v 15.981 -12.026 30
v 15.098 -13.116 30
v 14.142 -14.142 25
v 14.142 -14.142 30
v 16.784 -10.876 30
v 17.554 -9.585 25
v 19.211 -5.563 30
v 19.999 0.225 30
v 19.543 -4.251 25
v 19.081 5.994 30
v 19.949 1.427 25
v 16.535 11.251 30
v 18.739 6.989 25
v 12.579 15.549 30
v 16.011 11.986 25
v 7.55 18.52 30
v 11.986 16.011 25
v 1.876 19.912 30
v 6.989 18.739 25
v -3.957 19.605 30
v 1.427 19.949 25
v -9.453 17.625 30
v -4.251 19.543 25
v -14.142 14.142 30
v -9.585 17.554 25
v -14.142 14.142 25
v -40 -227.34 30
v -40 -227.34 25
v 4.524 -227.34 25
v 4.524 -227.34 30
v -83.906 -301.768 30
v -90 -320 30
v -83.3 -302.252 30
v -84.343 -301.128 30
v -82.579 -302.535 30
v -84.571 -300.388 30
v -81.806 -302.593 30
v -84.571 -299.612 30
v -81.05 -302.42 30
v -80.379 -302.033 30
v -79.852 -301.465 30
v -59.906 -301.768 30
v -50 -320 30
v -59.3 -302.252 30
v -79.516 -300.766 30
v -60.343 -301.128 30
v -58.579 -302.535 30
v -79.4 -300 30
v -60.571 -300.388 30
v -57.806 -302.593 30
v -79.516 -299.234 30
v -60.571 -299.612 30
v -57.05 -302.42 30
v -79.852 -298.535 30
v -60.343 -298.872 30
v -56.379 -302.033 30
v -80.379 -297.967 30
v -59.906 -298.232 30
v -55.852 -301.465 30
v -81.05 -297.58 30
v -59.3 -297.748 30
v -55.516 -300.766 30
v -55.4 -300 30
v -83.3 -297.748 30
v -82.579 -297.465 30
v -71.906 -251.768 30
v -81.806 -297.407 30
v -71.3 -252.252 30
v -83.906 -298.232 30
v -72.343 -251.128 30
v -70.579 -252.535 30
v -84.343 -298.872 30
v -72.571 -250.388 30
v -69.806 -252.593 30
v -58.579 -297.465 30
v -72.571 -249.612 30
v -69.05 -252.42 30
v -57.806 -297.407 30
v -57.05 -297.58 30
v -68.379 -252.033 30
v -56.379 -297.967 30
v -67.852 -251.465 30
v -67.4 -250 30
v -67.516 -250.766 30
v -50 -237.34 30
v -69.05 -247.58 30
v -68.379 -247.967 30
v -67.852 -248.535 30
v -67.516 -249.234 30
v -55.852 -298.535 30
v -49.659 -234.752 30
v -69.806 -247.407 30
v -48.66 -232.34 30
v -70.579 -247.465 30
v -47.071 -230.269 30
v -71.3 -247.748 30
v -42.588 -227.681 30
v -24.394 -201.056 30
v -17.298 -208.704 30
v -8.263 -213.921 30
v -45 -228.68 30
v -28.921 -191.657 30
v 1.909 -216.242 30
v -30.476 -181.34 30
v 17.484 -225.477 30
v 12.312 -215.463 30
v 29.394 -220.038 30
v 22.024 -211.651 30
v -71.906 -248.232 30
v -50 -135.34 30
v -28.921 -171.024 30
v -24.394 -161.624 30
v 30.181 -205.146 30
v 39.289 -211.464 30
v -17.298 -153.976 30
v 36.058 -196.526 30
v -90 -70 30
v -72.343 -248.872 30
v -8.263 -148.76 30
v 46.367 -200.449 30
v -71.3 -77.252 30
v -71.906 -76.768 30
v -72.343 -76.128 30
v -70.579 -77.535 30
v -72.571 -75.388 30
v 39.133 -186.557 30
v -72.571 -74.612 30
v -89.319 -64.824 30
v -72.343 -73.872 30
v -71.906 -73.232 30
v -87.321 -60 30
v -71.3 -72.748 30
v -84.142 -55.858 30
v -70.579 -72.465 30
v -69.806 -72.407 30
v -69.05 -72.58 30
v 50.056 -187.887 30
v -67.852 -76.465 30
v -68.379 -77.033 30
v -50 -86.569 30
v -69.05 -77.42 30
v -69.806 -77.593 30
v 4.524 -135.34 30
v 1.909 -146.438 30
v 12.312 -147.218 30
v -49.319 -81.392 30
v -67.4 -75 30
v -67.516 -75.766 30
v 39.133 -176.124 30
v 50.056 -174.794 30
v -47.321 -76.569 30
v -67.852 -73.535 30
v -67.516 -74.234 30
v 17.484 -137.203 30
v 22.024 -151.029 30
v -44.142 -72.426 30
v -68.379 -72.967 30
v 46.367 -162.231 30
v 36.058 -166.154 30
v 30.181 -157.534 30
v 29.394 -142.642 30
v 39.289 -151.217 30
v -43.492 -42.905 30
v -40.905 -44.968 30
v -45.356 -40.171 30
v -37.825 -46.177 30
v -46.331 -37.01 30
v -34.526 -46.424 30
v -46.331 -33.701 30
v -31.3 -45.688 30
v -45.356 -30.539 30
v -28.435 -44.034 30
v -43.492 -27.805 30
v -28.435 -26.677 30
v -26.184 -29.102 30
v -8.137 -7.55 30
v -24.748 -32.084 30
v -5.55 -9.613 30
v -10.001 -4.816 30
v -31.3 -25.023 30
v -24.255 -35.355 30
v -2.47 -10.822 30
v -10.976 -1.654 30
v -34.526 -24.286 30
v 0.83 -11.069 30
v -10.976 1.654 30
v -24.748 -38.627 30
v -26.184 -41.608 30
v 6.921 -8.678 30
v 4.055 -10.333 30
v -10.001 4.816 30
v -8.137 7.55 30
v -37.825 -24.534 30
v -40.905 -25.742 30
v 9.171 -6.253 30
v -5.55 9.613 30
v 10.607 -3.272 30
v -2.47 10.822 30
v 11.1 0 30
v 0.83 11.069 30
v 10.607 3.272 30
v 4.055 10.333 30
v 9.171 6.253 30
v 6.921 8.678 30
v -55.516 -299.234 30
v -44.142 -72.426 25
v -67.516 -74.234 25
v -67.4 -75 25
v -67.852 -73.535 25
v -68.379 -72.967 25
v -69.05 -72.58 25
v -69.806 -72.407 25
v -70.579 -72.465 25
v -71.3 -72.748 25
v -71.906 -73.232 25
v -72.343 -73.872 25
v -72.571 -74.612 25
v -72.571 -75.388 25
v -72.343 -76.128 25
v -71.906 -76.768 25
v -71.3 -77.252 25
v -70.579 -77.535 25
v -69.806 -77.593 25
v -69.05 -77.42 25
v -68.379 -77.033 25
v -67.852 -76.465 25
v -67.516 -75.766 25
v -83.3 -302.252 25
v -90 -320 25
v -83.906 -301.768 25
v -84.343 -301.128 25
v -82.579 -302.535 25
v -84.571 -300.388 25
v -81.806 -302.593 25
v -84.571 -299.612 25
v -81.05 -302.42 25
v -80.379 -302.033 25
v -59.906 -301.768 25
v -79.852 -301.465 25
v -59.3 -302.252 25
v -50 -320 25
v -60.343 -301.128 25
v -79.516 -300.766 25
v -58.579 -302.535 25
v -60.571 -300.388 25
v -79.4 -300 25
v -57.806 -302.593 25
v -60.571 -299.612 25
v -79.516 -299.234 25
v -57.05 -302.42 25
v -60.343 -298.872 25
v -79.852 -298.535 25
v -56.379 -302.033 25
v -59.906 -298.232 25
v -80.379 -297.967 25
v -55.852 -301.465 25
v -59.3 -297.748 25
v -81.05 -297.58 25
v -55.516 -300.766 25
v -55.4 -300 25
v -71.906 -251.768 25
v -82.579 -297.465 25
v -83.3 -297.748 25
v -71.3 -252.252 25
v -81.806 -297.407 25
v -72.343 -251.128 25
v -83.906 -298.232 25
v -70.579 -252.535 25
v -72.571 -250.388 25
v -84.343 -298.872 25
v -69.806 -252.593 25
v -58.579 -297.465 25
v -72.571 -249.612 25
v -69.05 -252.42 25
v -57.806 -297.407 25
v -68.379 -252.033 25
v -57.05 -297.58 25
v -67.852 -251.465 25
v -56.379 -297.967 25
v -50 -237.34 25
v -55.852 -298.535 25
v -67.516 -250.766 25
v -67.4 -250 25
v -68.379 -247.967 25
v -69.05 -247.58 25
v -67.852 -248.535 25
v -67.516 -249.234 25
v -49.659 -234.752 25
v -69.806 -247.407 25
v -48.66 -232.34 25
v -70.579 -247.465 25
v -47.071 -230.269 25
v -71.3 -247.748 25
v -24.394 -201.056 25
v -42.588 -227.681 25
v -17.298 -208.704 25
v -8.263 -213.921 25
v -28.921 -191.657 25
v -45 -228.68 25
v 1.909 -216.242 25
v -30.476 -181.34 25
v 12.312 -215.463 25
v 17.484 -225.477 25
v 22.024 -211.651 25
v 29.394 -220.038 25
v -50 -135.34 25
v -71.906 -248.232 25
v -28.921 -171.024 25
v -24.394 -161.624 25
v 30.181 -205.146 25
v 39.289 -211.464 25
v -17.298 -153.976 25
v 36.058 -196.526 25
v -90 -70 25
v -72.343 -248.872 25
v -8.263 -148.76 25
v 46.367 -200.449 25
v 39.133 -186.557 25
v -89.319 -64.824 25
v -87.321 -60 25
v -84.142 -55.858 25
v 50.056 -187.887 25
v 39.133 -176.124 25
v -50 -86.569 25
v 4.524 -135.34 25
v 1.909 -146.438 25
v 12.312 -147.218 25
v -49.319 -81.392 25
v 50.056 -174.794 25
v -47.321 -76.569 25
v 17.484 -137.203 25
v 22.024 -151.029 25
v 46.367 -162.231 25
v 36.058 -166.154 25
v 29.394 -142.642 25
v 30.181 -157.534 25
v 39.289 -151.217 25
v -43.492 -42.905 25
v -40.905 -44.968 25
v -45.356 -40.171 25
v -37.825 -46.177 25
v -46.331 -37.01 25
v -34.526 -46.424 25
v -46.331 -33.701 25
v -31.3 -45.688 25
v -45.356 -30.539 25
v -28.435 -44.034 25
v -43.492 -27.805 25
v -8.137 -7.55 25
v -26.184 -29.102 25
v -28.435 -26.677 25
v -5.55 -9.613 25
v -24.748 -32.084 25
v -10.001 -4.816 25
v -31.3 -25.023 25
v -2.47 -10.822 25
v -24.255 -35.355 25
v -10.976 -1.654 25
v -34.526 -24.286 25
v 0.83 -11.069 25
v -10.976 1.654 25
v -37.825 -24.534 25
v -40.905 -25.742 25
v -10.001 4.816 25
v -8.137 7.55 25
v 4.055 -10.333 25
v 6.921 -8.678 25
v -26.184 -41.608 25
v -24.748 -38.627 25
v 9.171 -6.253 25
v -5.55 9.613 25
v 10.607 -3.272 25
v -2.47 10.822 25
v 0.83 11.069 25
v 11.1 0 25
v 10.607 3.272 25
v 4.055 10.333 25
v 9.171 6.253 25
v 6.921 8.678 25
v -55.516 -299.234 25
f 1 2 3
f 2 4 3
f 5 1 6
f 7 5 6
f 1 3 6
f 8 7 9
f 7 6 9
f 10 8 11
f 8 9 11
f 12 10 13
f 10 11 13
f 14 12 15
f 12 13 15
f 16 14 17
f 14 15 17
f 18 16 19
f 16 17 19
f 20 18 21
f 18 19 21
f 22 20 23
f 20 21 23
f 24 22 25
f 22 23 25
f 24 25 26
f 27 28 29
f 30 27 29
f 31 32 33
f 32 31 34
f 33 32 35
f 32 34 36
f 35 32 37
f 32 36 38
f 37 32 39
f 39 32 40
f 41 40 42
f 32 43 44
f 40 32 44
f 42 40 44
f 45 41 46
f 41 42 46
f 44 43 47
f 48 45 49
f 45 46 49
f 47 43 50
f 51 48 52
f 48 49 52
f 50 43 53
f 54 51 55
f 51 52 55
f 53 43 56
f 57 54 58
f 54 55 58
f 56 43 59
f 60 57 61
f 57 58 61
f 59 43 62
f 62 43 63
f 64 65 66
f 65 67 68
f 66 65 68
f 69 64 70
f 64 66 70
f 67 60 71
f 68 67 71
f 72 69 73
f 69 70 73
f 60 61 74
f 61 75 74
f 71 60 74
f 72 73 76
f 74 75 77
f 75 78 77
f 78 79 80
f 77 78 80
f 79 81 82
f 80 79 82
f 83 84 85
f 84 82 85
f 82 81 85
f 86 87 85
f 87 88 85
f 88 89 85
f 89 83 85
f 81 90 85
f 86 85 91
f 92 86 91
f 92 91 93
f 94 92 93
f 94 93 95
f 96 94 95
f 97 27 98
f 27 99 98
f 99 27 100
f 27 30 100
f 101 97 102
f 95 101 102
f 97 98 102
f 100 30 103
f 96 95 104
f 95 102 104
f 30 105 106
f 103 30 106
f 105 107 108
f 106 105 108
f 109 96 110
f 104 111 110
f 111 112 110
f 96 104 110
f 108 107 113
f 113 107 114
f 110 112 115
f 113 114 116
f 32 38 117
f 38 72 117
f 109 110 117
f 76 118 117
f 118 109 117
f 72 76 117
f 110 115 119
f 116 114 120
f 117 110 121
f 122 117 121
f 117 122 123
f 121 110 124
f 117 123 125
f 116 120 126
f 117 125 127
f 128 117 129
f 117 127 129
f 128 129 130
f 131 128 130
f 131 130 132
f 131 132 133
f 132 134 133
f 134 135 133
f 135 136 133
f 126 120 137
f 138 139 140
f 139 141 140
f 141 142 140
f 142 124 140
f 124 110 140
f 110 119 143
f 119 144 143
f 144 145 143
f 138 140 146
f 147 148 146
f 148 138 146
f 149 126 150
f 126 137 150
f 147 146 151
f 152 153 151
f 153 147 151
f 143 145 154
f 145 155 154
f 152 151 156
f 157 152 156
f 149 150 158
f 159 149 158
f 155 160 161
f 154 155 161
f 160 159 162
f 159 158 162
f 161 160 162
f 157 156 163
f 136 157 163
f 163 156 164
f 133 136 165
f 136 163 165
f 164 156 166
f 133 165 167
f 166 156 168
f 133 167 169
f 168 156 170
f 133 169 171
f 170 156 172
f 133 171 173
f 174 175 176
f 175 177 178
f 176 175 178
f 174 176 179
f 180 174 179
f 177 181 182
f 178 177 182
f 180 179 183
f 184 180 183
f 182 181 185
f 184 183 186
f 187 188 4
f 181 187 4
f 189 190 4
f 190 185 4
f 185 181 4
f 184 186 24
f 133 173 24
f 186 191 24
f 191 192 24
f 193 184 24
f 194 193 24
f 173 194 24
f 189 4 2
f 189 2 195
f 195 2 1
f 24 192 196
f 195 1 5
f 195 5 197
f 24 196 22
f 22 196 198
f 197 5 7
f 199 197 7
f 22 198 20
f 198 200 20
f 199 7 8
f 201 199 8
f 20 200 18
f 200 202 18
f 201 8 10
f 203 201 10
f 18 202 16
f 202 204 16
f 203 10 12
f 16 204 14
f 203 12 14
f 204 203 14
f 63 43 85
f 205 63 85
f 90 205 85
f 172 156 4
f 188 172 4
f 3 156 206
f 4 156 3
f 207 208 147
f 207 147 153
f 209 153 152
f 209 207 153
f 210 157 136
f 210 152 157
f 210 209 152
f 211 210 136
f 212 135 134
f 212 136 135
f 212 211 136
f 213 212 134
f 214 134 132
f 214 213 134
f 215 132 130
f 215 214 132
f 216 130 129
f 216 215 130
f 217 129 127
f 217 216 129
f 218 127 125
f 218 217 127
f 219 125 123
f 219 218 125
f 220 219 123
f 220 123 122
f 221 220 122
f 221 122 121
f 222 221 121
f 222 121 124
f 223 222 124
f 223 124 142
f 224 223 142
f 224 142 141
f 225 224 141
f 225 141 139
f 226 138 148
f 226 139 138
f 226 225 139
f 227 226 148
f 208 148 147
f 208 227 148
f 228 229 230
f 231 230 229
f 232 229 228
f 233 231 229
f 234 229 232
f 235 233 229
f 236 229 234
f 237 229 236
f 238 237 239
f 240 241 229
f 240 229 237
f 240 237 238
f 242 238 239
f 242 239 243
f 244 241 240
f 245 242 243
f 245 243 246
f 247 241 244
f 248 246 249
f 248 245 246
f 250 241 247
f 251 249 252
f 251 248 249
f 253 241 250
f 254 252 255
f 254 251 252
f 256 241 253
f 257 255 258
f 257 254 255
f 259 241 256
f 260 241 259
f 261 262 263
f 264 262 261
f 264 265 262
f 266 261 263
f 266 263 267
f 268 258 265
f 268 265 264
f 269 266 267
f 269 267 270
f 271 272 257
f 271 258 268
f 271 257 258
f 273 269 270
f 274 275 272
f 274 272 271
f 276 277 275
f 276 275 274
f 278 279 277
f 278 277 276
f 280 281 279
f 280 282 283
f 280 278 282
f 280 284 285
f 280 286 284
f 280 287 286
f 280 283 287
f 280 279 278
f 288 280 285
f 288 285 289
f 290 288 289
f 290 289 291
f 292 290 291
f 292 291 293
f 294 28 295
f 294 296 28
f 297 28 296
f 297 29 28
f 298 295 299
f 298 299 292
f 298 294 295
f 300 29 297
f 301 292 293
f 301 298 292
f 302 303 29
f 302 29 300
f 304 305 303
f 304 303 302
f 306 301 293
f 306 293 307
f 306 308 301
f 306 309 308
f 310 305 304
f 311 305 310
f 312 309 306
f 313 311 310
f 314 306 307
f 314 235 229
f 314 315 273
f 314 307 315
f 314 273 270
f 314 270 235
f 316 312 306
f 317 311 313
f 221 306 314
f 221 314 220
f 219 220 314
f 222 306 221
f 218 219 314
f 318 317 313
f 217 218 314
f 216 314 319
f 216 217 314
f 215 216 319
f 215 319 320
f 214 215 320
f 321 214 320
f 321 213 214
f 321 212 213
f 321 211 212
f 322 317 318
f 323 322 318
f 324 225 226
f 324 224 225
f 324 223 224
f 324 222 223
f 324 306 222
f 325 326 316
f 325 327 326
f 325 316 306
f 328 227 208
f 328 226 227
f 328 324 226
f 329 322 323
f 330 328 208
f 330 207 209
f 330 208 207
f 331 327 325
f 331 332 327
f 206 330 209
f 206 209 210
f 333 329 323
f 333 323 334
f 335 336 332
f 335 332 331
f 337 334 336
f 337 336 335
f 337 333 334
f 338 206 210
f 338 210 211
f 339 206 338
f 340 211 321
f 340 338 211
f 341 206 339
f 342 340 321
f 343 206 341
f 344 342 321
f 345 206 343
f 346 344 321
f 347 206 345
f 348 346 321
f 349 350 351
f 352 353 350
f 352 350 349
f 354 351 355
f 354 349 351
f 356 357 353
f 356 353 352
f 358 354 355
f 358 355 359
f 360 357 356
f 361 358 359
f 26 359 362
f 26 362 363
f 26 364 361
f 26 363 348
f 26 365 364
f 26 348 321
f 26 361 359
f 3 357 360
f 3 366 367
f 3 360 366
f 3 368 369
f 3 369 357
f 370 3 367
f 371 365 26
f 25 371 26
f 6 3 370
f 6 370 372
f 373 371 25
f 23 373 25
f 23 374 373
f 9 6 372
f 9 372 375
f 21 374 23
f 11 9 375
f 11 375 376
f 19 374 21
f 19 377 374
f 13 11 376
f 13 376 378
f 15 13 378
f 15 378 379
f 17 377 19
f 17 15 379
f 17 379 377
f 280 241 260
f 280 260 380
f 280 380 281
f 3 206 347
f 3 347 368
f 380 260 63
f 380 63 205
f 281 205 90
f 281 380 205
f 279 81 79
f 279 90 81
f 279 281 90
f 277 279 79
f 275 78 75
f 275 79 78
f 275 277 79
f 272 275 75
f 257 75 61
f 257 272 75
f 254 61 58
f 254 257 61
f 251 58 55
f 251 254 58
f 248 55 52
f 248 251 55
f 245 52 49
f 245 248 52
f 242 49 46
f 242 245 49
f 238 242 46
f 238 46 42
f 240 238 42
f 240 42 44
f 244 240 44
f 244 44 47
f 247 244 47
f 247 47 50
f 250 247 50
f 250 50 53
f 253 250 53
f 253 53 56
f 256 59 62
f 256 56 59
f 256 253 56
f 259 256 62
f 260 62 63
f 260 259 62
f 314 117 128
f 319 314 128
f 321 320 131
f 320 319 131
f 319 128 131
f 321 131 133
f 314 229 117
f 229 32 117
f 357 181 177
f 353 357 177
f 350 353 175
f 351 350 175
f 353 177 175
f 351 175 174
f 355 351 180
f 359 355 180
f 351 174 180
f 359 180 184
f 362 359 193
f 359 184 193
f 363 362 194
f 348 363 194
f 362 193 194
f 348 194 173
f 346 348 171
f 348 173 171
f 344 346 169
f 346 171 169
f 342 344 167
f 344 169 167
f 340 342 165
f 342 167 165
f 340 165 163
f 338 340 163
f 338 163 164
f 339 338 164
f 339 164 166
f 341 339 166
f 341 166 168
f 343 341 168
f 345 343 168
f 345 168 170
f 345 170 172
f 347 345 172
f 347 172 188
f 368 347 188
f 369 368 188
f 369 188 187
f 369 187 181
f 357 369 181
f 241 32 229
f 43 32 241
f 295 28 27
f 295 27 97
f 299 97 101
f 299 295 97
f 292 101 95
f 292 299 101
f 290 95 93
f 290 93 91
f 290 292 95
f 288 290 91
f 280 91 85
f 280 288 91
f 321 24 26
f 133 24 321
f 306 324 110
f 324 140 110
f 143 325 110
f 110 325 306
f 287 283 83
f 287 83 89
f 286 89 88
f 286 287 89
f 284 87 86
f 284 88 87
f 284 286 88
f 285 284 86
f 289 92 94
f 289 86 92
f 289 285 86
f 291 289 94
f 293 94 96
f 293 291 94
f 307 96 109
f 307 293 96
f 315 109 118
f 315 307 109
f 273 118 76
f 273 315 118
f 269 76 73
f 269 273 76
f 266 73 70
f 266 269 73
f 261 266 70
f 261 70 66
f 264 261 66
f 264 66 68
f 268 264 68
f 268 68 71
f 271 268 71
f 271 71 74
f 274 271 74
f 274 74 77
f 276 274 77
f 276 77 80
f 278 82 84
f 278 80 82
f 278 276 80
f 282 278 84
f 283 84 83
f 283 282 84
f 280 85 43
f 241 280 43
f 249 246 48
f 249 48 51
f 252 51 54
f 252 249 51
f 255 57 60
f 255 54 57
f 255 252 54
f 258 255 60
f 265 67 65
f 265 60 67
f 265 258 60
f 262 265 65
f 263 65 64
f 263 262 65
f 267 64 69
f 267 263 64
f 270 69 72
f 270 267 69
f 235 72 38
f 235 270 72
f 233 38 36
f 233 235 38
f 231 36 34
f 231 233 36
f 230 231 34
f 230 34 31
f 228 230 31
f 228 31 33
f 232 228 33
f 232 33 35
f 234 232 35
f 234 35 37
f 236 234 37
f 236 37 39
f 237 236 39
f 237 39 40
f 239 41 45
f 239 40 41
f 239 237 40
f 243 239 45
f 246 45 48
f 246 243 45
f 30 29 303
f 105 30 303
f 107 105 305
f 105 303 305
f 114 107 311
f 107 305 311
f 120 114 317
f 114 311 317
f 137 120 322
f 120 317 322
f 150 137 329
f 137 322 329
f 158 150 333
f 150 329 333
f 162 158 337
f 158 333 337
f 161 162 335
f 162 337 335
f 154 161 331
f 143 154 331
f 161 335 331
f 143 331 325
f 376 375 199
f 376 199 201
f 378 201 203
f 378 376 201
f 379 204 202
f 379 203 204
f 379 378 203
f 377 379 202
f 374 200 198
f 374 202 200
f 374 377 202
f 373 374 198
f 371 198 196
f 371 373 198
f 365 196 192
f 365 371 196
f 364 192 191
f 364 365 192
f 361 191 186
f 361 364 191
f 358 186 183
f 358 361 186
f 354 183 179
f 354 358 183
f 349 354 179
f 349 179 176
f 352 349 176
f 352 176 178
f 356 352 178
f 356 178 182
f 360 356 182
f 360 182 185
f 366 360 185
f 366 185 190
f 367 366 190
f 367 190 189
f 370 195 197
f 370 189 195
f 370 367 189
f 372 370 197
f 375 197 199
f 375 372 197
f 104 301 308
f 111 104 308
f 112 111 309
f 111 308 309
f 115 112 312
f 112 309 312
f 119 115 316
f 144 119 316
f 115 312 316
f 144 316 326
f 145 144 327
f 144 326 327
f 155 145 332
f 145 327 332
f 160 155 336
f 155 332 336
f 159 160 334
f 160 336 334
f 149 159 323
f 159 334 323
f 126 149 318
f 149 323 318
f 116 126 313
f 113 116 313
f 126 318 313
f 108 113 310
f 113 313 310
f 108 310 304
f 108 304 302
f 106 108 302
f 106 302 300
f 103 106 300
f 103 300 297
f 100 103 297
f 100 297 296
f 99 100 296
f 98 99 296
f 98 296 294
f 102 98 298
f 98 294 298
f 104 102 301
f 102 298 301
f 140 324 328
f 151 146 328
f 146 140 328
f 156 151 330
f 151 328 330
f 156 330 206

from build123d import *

# Parameters (mm, degrees)
SKETCH_1_R                = 20
SKETCH_1_R_2              = 11.1
EXTRUDE_1_DEPTH           = 60
EXTRUDE_2_DEPTH           = 30
SKETCH_4_R                = 11
EXTRUDE_3_DEPTH           = 5
SKETCH_8_R                = 11.1
CUT_EXTRUDE_1_DEPTH       = 100
FILLET_4_R                = 20
EXTRUDE_START             = -30
SKETCH_18_R               = 35
EXTRUDE_4_DEPTH           = 5
EXTRUDE_START_2           = -25
SKETCH_19_R               = 35
EXTRUDE_5_DEPTH           = 5
FILLET_5_R                = 10
CUT_EXTRUDE_9_DEPTH       = 388.169213652
CUT_EXTRUDE_9_DEPTH_BACK  = 388.169213652
SKETCH_21_R               = 2.6
CUT_EXTRUDE_10_DEPTH      = 409.372938359
CUT_EXTRUDE_10_DEPTH_BACK = 409.372938359
SKETCH_22_W               = 30
SKETCH_22_H               = 469.737304999
SKETCH_22_W_2             = 35
SKETCH_22_H_2             = 431.087956996


with BuildPart() as part:
    # 草图1 → 凸台-拉伸1 (new body)
    with BuildSketch(Plane.XY):
        Circle(SKETCH_1_R)
        Circle(SKETCH_1_R_2, mode=Mode.SUBTRACT)
    extrude(amount=EXTRUDE_1_DEPTH)

    # 草图2 → 凸台-拉伸2 (add, symmetric)
    with BuildSketch(Plane.XY.offset(30)):
        with BuildLine():
            Line((-14.142135624, 14.142135624), (-90, -61.715728753))
            Line((-90, -61.715728753), (-90, -320))
            Line((-90, -320), (-50, -320))
            Line((-50, -320), (-50, -78.284271247))
            Line((-50, -78.284271247), (14.142135624, -14.142135624))
            ThreePointArc((14.142135624, -14.142135624), (-14.142135624, -14.142135624), (-14.142135624, 14.142135624))
        make_face()
    extrude(amount=EXTRUDE_2_DEPTH, both=True)

    # 草图4 → 凸台-拉伸3 (add)
    with BuildSketch(Plane.XY.offset(60)):
        with BuildLine():
            Line((-90, -290), (-50, -290))
            Line((-50, -290), (-50, -350))
            ThreePointArc((-50, -350), (-70, -370), (-90, -350))
            Line((-90, -350), (-90, -290))
        make_face()
        with Locations((-70, -350)):
            Circle(SKETCH_4_R, mode=Mode.SUBTRACT)
    extrude_3 = extrude(amount=EXTRUDE_3_DEPTH)

    # 镜向1: 凸台-拉伸3 across plane
    add(extrude_3.mirror(Plane.XY.offset(30)))

    # 草图8 → 切除-拉伸1 (cut)
    with BuildSketch(Plane.XY.offset(60)):
        with Locations((-35.355339059, -35.355339059)):
            Circle(SKETCH_8_R)
    extrude(amount=-CUT_EXTRUDE_1_DEPTH, mode=Mode.SUBTRACT)

    # 圆角4
    fillet_4_edges = [part.edges().sort_by_distance(p)[0] for p in [
        (-50, -78.284271247, 30),
        (-90, -61.715728753, 30),
    ]]
    fillet(fillet_4_edges, radius=FILLET_4_R)

    # 草图18 → 凸台-拉伸4 (add)
    with BuildSketch(Plane.XY.offset(60).offset(EXTRUDE_START)):
        with BuildLine():
            ThreePointArc((16.783988507, -10.876475983), (15.54903282, -12.578854413), (14.142135624, -14.142135624))
            Line((14.142135624, -14.142135624), (-44.142135624, -72.426406871))
            ThreePointArc((-44.142135624, -72.426406871), (-48.47759065, -78.914873848), (-50, -86.568542495))
            Line((-50, -86.568542495), (-50, -129.282056212))
            Line((-50, -129.282056212), (24.135744866, -129.282056212))
            ThreePointArc((24.135744866, -129.282056212), (66.634203362, -100.885494101), (56.662656801, -50.755144277))
            Line((56.662656801, -50.755144277), (16.783988507, -10.876475983))
        make_face()
        with Locations((24.135744866, -83.282056212)):
            Circle(SKETCH_18_R, mode=Mode.SUBTRACT)
    extrude(amount=EXTRUDE_4_DEPTH)

    # 草图19 → 凸台-拉伸5 (add)
    with BuildSketch(Plane(origin=(0, 0, 0), x_dir=(-1, 0, 0), z_dir=(0, 0, -1)).offset(EXTRUDE_START_2)):
        with BuildLine():
            Line((50, -135.340123781), (50, -227.340123781))
            Line((50, -227.340123781), (-4.524131353, -227.340123781))
            ThreePointArc((-4.524131353, -227.340123781), (-50.524131353, -181.340123781), (-4.524131353, -135.340123781))
            Line((-4.524131353, -135.340123781), (50, -135.340123781))
        make_face()
        with Locations((-4.524131353, -181.340123781)):
            Circle(SKETCH_19_R, mode=Mode.SUBTRACT)
    extrude(amount=-EXTRUDE_5_DEPTH)

    # 圆角5
    # the kernel refuses this fillet: 10 mm, written as the material it adds along each edge
    with BuildSketch(Plane(origin=(-50, -227.340123781, 25), x_dir=(0, -1, 0), z_dir=(0, 0, 1)), Plane(origin=(-50, -129.282056212, 30), x_dir=(0, -1, 0), z_dir=(0, 0, 1))) as fillet_5_piece_1:
        with BuildLine():
            CenterArc((FILLET_5_R, FILLET_5_R), FILLET_5_R, 180, 90)
            Line((0, FILLET_5_R), (0, 0))
            Line((0, 0), (FILLET_5_R, 0))
        make_face()
    extrude(amount=5)

    # 草图21 → 切除-拉伸9 (cut, two sides: drawn at the far end of the back side and taken through both)
    with BuildSketch(Plane.XY.offset(65).offset(-CUT_EXTRUDE_9_DEPTH_BACK)):
        with Locations((-70, -75)):
            Circle(SKETCH_21_R)
        with Locations((-70, -250)):
            Circle(SKETCH_21_R)
        with Locations((-58, -300)):
            Circle(SKETCH_21_R)
        with Locations((-82, -300)):
            Circle(SKETCH_21_R)
    extrude(amount=CUT_EXTRUDE_9_DEPTH + CUT_EXTRUDE_9_DEPTH_BACK, mode=Mode.SUBTRACT)

    # 草图22 → 切除-拉伸10 (cut, two sides: drawn at the far end of the back side and taken through both)
    with BuildSketch(Plane.ZY.offset(90).offset(-CUT_EXTRUDE_10_DEPTH_BACK)):
        with Locations((10, -169.950732915)):
            Rectangle(SKETCH_22_W, SKETCH_22_H)
        with Locations((47.5, -154.456021502)):
            Rectangle(SKETCH_22_W_2, SKETCH_22_H_2)
    extrude(amount=CUT_EXTRUDE_10_DEPTH + CUT_EXTRUDE_10_DEPTH_BACK, mode=Mode.SUBTRACT)


solid = part.part
